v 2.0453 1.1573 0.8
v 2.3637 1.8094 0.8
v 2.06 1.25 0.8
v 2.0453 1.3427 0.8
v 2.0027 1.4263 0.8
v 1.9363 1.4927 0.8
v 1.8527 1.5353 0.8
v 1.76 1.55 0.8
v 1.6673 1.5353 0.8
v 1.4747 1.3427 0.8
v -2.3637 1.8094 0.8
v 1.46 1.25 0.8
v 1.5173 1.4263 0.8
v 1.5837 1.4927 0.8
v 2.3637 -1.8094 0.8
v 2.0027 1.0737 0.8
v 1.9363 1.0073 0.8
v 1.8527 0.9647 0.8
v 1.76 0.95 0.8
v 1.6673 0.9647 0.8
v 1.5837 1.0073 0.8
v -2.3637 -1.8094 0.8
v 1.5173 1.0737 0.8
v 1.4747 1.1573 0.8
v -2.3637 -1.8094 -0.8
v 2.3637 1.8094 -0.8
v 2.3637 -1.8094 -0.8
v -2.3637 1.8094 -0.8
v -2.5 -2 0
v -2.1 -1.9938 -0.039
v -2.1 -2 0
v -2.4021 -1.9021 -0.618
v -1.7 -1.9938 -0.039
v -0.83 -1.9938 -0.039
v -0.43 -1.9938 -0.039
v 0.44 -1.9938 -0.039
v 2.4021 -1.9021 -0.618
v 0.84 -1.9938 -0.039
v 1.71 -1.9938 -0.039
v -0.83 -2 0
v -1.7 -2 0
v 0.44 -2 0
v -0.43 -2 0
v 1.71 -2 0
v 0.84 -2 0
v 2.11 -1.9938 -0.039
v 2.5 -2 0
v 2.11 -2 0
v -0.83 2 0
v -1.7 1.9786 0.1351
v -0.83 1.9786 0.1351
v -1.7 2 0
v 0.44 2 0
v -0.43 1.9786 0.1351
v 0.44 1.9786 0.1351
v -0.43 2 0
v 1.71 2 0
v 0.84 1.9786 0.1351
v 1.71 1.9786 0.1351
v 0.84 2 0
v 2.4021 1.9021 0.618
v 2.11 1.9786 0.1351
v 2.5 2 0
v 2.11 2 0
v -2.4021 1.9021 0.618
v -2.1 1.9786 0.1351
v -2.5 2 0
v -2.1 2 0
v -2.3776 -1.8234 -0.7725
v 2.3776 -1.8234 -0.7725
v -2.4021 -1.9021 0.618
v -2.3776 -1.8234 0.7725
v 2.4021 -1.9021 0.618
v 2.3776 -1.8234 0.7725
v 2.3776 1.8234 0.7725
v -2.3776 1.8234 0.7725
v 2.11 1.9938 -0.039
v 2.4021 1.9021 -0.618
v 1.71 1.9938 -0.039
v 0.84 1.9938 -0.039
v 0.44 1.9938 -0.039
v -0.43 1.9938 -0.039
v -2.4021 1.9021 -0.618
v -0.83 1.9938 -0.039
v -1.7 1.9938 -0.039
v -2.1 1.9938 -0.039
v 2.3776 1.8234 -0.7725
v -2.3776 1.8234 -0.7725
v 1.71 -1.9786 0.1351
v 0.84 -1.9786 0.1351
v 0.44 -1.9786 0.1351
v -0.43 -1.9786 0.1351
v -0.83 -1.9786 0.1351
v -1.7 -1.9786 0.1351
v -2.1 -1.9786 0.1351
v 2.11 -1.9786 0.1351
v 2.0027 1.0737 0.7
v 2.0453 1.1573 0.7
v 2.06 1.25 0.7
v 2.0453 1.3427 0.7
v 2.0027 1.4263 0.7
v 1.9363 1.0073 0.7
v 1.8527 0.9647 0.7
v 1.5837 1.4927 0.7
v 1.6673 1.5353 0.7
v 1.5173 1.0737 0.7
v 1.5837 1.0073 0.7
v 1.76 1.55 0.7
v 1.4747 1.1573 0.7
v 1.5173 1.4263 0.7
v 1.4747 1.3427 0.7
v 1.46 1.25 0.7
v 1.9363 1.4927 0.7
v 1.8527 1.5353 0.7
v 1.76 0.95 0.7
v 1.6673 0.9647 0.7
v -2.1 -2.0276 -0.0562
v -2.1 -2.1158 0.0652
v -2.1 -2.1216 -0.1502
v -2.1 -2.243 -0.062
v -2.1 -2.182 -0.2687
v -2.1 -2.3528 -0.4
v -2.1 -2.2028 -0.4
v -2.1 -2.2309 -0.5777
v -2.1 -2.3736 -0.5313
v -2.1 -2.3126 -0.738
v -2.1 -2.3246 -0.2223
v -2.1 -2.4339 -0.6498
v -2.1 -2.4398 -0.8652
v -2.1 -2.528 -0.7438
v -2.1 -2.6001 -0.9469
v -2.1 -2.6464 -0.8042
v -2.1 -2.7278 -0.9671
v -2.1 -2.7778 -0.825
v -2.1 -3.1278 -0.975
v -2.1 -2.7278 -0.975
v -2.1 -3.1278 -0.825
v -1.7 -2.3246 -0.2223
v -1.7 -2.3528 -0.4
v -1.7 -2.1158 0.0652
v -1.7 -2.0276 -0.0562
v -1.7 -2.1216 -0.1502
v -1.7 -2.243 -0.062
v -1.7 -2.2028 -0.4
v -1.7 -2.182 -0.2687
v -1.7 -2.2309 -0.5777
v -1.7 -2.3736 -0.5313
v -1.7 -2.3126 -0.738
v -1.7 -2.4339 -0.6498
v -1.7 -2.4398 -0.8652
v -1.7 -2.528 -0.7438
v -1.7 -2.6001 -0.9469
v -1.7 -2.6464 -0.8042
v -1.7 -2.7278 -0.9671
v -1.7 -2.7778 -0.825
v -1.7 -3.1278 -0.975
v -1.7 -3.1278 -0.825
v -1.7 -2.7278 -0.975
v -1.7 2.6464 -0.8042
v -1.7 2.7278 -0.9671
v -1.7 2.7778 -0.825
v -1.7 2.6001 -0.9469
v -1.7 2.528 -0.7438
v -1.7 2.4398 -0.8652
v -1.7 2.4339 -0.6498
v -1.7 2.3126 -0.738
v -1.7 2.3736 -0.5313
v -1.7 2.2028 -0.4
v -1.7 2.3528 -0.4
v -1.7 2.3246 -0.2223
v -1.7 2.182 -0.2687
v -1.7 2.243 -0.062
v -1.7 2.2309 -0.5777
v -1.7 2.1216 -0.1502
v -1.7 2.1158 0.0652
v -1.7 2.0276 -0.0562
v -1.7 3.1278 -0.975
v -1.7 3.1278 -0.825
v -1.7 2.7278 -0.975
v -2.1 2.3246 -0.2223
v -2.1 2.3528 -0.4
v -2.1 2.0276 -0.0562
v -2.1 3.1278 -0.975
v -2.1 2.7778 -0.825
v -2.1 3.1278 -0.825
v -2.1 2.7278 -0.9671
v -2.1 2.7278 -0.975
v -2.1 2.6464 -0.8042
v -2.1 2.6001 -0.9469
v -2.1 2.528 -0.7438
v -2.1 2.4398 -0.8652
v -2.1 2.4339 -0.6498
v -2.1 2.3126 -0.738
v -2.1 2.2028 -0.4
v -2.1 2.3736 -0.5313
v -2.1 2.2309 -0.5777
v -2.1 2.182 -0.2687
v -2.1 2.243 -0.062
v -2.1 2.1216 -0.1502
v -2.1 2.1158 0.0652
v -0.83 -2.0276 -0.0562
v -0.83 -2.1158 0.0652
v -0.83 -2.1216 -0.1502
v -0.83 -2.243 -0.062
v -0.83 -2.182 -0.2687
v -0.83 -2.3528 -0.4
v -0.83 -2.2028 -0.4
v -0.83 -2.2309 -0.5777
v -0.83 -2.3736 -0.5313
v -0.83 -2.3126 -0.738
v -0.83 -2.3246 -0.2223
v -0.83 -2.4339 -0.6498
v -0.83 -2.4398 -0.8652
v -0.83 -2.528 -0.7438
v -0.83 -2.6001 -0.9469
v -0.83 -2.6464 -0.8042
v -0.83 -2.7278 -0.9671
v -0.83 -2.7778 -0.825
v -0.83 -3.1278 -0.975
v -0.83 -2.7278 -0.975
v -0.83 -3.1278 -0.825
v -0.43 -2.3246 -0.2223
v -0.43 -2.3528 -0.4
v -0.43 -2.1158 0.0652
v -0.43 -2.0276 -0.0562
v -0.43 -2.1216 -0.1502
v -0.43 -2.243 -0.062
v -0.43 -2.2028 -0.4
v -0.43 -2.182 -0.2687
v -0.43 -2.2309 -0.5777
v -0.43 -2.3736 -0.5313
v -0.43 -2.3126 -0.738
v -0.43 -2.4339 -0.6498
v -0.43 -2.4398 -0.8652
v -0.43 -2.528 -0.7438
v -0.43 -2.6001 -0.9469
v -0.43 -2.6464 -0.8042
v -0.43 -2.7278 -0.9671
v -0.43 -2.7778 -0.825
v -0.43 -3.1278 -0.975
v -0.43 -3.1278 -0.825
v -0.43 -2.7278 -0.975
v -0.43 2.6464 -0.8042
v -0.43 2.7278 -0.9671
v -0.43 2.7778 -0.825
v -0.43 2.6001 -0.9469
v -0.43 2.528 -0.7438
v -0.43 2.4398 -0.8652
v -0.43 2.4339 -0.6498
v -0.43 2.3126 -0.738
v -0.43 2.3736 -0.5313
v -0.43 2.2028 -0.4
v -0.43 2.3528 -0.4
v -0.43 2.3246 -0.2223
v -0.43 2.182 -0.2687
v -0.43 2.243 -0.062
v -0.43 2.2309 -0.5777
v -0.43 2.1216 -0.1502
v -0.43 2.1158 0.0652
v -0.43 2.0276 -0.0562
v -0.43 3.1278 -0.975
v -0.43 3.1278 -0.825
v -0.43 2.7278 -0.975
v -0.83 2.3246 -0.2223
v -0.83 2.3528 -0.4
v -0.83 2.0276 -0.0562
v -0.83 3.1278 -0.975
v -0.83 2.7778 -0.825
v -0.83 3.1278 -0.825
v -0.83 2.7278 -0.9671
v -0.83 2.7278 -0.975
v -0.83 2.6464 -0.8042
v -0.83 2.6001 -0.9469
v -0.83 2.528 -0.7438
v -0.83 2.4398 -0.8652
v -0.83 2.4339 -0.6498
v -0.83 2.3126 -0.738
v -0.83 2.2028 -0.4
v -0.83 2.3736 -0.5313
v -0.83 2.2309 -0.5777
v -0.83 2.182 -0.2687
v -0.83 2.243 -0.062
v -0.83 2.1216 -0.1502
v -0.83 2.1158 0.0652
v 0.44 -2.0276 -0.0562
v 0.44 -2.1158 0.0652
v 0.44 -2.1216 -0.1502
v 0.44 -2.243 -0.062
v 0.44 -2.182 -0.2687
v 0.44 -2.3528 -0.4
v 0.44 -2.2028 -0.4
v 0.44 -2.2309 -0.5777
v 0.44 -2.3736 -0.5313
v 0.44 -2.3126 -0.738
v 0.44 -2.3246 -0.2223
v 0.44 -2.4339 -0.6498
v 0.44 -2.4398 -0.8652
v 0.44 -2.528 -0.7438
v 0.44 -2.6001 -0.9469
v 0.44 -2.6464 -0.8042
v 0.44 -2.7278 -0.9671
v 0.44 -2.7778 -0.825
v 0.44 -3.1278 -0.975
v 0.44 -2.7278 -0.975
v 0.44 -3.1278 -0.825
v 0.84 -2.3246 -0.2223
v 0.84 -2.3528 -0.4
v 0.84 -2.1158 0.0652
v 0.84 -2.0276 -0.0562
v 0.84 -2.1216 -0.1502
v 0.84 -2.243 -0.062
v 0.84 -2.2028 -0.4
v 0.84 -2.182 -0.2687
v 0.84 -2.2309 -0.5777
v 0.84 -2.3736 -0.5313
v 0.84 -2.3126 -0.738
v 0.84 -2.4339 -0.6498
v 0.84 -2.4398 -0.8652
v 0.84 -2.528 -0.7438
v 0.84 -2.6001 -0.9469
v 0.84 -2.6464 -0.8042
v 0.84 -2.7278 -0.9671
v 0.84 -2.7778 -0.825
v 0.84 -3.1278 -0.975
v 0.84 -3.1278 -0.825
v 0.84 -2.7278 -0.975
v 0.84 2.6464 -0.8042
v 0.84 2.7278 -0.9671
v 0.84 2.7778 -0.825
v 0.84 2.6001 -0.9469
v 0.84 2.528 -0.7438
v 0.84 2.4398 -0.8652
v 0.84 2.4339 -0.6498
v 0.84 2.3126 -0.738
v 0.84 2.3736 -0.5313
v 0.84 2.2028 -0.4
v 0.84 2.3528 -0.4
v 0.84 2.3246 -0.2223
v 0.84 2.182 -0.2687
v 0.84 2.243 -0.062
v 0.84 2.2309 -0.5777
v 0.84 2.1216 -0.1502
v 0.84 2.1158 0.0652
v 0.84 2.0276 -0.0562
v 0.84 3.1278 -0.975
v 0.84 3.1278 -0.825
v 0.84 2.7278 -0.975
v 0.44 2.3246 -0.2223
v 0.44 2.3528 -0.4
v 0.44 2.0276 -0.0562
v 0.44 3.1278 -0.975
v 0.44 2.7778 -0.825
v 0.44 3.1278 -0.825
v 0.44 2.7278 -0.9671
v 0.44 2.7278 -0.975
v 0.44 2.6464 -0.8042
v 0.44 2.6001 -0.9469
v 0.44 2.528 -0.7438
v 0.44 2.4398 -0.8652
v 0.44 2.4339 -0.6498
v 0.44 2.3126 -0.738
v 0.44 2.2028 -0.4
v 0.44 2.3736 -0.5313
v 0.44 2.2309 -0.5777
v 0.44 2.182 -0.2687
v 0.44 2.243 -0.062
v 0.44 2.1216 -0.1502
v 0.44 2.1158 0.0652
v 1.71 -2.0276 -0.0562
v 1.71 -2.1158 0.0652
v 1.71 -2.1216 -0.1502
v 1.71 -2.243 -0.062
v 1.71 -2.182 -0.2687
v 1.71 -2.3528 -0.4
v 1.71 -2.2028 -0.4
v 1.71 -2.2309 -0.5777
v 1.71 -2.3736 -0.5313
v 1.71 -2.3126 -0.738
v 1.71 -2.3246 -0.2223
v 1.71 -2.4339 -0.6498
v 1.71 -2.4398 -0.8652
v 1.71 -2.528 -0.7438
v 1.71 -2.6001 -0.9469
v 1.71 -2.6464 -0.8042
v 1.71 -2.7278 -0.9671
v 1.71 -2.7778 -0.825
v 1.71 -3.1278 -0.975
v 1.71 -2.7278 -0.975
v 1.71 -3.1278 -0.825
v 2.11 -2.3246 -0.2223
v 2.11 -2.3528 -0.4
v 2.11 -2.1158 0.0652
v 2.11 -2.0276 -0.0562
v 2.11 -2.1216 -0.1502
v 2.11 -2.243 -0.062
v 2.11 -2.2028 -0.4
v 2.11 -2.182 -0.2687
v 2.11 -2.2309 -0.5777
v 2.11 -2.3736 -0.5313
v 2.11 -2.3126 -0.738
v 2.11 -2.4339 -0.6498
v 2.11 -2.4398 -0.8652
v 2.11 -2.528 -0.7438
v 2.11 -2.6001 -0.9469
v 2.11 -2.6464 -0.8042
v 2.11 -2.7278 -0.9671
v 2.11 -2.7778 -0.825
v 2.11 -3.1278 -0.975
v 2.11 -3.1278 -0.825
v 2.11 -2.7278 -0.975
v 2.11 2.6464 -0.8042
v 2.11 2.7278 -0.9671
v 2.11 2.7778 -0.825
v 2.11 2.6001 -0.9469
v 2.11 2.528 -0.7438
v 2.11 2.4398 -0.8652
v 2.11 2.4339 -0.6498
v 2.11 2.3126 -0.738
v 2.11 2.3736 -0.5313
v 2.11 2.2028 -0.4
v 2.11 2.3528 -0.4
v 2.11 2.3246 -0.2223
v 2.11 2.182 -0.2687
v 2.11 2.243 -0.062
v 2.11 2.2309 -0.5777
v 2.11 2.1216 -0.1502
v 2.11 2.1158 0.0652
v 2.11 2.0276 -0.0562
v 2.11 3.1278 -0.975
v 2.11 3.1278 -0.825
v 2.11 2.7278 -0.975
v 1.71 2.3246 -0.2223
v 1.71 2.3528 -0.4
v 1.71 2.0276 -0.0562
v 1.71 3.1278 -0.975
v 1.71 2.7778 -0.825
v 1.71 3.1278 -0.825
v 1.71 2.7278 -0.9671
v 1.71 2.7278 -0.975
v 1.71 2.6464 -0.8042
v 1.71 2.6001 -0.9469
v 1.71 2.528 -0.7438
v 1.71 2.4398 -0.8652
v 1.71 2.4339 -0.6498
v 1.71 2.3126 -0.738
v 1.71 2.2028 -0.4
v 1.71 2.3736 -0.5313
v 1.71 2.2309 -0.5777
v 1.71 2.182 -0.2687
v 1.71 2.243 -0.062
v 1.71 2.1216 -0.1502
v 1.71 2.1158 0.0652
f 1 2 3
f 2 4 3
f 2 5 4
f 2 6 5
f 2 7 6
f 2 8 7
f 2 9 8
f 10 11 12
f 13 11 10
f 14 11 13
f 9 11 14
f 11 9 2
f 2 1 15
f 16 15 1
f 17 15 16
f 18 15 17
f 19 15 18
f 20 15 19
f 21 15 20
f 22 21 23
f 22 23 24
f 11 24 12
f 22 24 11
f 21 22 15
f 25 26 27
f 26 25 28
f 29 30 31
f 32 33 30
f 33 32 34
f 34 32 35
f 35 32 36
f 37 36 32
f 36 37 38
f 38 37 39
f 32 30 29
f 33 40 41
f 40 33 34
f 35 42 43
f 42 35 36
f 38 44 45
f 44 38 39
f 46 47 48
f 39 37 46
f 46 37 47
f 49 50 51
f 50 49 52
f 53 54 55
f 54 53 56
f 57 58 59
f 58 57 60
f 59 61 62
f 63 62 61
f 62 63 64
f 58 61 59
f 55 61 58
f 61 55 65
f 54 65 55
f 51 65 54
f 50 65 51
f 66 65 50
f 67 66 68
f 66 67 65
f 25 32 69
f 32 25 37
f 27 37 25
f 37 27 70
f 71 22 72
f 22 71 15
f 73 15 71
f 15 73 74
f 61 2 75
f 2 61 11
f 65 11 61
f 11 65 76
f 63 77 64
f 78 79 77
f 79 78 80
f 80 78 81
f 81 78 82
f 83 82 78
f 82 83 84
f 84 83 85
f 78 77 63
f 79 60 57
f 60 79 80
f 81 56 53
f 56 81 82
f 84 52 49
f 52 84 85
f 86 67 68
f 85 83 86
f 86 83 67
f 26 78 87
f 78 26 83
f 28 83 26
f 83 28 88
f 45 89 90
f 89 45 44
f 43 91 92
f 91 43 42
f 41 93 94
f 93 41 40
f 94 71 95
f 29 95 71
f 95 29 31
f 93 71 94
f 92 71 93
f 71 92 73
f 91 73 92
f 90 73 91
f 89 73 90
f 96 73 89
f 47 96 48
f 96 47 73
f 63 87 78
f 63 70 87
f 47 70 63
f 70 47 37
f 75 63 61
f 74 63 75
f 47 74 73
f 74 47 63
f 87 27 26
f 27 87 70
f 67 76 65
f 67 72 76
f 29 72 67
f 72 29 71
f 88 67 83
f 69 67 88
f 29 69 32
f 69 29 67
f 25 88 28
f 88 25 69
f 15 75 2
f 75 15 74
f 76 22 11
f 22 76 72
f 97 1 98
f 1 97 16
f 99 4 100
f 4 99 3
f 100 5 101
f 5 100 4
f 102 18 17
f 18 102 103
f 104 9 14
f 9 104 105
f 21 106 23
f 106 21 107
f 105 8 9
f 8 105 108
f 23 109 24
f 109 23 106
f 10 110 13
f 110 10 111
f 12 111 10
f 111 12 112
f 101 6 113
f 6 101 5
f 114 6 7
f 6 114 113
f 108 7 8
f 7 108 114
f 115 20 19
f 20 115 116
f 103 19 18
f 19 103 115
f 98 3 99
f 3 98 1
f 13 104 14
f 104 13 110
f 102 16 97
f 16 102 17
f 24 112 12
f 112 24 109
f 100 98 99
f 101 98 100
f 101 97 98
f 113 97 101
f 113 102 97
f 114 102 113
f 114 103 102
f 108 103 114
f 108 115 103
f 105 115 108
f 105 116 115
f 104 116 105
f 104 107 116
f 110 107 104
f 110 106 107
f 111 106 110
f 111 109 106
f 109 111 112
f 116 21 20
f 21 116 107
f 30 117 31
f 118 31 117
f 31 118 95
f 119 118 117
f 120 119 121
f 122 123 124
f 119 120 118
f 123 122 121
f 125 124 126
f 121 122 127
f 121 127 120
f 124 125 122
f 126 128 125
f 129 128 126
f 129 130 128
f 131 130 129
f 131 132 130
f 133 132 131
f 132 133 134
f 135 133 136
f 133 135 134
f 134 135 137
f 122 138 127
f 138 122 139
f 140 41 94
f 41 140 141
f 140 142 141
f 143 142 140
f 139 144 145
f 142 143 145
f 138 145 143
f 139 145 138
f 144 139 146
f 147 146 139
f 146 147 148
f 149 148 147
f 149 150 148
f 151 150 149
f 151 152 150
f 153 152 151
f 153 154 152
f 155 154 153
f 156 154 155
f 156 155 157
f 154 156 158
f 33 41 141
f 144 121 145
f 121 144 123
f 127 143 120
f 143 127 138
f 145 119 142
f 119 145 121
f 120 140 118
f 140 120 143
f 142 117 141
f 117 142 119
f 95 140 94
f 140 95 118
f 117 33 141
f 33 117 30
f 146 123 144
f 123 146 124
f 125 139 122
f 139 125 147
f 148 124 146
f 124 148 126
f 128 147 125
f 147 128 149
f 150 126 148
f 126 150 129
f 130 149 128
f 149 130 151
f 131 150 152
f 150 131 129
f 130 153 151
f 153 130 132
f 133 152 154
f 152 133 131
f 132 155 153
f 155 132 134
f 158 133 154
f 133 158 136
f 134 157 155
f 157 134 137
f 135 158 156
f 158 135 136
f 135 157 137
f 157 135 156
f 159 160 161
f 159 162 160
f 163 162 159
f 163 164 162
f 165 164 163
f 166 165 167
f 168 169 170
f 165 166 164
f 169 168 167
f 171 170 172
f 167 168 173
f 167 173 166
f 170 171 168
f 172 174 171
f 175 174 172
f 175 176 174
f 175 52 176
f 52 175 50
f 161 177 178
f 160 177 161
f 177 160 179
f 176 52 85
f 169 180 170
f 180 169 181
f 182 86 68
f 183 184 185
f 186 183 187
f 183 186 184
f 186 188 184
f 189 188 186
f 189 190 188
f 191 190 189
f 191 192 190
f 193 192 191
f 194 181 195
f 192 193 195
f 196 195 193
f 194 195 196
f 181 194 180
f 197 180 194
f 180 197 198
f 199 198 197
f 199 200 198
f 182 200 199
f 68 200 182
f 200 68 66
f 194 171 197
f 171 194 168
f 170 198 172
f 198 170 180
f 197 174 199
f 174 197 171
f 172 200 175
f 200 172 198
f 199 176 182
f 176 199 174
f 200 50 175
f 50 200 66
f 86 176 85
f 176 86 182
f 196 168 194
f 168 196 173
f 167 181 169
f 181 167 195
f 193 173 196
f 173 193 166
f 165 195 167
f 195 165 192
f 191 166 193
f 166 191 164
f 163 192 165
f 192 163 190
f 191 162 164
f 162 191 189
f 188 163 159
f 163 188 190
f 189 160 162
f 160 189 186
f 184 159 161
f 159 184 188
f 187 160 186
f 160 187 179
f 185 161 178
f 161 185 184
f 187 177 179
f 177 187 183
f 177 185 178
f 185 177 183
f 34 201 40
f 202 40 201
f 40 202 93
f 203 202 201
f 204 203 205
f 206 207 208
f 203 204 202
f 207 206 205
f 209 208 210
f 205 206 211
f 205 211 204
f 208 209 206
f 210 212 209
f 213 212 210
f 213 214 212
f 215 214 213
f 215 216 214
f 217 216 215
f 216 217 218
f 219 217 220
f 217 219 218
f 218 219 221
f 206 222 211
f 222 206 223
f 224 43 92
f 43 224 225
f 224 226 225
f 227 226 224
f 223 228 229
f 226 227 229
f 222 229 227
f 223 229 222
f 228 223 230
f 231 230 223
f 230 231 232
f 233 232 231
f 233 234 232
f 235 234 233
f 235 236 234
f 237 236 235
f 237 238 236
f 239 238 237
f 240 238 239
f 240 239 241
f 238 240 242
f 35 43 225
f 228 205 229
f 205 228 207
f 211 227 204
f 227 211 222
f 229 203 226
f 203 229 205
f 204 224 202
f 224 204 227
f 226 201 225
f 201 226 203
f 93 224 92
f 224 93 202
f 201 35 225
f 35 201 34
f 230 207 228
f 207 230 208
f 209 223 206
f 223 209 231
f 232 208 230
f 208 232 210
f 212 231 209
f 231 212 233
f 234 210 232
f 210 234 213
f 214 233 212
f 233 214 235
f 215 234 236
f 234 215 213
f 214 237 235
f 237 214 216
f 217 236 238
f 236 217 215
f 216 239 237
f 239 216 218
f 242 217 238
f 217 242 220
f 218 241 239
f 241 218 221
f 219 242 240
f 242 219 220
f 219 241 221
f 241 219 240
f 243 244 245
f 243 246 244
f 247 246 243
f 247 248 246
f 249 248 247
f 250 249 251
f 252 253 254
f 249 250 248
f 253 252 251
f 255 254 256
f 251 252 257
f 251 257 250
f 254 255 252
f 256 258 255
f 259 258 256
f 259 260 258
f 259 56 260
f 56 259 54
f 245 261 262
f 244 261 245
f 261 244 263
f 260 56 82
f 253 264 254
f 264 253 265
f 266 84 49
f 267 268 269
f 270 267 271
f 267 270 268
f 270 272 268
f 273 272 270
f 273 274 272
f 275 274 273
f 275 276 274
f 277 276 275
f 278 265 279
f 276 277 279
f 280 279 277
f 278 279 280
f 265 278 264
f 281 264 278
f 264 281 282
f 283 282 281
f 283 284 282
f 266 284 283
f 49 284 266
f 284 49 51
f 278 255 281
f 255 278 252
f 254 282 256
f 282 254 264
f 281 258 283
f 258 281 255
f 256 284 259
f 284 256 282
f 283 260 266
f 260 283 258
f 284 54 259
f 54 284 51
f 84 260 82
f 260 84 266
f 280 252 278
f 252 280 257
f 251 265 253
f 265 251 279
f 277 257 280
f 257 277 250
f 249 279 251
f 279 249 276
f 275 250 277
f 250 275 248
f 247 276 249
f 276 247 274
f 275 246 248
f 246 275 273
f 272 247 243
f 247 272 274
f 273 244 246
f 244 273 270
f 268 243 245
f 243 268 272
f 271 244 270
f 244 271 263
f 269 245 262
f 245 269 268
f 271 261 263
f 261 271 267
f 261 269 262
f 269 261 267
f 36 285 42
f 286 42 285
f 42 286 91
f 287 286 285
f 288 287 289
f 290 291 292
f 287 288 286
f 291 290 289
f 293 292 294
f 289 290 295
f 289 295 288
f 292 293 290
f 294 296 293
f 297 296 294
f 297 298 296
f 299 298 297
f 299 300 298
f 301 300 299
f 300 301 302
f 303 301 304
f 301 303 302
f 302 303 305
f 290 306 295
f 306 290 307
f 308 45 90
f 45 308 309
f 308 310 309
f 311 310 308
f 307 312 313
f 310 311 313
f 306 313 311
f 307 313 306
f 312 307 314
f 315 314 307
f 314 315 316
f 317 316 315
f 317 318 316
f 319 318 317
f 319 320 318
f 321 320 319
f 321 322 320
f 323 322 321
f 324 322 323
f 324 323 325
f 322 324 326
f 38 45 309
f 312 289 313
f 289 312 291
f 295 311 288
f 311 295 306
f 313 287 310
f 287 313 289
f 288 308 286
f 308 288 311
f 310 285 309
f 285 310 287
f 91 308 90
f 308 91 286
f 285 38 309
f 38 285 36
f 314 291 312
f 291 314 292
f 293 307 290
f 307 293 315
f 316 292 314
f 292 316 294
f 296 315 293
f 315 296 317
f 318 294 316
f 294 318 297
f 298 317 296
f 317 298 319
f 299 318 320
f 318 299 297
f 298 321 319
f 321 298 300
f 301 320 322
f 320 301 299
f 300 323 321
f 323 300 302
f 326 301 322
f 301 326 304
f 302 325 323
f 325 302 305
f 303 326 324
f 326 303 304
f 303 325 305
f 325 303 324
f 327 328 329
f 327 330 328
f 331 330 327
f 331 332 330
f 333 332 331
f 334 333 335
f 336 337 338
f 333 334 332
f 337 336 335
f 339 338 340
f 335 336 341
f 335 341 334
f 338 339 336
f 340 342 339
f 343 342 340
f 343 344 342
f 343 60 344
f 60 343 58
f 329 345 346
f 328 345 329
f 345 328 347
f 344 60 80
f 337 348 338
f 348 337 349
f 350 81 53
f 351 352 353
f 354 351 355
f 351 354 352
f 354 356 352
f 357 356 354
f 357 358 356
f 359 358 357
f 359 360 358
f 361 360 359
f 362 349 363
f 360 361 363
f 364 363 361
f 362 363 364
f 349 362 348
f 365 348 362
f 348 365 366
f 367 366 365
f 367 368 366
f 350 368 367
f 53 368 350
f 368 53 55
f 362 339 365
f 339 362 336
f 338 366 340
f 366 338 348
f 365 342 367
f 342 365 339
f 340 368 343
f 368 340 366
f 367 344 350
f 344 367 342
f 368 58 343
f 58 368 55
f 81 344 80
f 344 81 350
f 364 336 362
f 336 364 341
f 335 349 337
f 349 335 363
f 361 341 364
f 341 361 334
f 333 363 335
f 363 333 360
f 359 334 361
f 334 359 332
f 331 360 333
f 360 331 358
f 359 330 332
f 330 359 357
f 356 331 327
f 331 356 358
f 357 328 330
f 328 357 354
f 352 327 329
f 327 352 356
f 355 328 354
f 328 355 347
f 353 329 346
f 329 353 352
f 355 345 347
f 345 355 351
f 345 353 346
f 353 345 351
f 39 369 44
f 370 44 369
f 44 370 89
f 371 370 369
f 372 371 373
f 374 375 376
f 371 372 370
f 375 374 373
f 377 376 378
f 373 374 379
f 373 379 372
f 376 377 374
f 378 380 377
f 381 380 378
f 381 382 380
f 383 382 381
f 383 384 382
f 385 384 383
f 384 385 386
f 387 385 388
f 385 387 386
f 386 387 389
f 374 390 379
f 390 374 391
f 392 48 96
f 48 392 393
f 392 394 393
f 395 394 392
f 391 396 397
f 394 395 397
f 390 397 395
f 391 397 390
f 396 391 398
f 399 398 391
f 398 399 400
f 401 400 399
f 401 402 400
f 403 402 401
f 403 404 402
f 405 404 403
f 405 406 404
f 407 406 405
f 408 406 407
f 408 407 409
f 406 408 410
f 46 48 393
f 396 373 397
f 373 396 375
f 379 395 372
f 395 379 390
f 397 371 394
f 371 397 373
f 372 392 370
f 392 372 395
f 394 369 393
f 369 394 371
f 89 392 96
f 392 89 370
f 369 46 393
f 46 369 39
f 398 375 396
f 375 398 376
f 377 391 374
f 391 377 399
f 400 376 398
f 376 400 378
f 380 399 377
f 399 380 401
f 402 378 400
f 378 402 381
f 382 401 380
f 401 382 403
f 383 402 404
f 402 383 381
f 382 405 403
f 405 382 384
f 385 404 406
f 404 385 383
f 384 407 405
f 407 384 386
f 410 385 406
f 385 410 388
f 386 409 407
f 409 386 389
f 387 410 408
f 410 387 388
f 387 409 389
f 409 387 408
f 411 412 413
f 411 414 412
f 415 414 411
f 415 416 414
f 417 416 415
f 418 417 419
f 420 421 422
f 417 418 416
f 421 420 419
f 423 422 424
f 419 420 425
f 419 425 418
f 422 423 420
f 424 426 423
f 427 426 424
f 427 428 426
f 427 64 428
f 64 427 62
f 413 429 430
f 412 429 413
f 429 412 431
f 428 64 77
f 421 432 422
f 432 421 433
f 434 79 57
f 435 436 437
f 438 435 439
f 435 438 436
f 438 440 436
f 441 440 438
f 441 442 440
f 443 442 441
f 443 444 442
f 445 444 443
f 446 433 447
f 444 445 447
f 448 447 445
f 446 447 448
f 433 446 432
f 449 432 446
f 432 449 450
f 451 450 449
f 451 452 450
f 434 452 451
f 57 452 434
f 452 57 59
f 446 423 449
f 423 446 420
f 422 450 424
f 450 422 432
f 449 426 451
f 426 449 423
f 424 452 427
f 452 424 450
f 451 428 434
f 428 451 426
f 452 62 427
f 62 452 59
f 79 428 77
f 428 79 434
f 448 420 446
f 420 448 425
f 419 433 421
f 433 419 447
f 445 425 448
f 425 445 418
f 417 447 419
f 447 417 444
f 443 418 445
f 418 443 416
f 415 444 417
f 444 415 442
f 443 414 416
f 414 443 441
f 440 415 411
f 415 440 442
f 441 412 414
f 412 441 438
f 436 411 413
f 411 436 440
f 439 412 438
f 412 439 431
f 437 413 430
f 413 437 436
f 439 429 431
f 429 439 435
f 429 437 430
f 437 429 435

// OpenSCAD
/**
 * @brief  SOP 8
 * @author nimisbert
 * @dims   [mm]
**/
$fn = 20;

W = 5;    // width
L = 4.4;  // length
H = 1.6;  // height
S = 1.27; // pad step

// body 

color("#555555")
difference() {
    body();
    translate([L/2.5,W/4,H/4+0.3])
    cylinder(0.4,0.3,0.3);
}

// pads

for( i = [0.3-L/2:S:0.3+L/2] ) {
        //translate([i,j,-H/2])
        color("#bbbbbb")
        pin([i,-W/1.8,-H/4],[0,0,90]);
        color("#bbbbbb")
        pin([i,W/1.8,-H/4],[0,0,-90]);
        
 
}

module pin(tran=[0,0,0], rot=[0,0,0]) {
    translate(tran)
    rotate(rot)
    {
        rotate([90,0,180])
        translate([-1,0,0])
        rotate_extrude(angle=90)
        translate([0.5,0,0])
        square([0.15,0.4], center=true);

        rotate([-90,0,0])
        rotate_extrude(angle=90)
        translate([0.5,0,0])
        square([0.15,0.4], center=true);

        translate([-0.15,0,-0.5])
        cube([0.4,0.4,0.15],true);
    }
}

module body() {
    intersection() {
    
    cube([W,L,H],true);
    rotate([0,90,0])
    cylinder(h=6,r=2,center=true);
    rotate([0,-90,90])
    cylinder(h=6,r=3.5,center=true);
    rotate([90,90,0])
    cylinder(h=5,r=2.5,center=true);
}

}
